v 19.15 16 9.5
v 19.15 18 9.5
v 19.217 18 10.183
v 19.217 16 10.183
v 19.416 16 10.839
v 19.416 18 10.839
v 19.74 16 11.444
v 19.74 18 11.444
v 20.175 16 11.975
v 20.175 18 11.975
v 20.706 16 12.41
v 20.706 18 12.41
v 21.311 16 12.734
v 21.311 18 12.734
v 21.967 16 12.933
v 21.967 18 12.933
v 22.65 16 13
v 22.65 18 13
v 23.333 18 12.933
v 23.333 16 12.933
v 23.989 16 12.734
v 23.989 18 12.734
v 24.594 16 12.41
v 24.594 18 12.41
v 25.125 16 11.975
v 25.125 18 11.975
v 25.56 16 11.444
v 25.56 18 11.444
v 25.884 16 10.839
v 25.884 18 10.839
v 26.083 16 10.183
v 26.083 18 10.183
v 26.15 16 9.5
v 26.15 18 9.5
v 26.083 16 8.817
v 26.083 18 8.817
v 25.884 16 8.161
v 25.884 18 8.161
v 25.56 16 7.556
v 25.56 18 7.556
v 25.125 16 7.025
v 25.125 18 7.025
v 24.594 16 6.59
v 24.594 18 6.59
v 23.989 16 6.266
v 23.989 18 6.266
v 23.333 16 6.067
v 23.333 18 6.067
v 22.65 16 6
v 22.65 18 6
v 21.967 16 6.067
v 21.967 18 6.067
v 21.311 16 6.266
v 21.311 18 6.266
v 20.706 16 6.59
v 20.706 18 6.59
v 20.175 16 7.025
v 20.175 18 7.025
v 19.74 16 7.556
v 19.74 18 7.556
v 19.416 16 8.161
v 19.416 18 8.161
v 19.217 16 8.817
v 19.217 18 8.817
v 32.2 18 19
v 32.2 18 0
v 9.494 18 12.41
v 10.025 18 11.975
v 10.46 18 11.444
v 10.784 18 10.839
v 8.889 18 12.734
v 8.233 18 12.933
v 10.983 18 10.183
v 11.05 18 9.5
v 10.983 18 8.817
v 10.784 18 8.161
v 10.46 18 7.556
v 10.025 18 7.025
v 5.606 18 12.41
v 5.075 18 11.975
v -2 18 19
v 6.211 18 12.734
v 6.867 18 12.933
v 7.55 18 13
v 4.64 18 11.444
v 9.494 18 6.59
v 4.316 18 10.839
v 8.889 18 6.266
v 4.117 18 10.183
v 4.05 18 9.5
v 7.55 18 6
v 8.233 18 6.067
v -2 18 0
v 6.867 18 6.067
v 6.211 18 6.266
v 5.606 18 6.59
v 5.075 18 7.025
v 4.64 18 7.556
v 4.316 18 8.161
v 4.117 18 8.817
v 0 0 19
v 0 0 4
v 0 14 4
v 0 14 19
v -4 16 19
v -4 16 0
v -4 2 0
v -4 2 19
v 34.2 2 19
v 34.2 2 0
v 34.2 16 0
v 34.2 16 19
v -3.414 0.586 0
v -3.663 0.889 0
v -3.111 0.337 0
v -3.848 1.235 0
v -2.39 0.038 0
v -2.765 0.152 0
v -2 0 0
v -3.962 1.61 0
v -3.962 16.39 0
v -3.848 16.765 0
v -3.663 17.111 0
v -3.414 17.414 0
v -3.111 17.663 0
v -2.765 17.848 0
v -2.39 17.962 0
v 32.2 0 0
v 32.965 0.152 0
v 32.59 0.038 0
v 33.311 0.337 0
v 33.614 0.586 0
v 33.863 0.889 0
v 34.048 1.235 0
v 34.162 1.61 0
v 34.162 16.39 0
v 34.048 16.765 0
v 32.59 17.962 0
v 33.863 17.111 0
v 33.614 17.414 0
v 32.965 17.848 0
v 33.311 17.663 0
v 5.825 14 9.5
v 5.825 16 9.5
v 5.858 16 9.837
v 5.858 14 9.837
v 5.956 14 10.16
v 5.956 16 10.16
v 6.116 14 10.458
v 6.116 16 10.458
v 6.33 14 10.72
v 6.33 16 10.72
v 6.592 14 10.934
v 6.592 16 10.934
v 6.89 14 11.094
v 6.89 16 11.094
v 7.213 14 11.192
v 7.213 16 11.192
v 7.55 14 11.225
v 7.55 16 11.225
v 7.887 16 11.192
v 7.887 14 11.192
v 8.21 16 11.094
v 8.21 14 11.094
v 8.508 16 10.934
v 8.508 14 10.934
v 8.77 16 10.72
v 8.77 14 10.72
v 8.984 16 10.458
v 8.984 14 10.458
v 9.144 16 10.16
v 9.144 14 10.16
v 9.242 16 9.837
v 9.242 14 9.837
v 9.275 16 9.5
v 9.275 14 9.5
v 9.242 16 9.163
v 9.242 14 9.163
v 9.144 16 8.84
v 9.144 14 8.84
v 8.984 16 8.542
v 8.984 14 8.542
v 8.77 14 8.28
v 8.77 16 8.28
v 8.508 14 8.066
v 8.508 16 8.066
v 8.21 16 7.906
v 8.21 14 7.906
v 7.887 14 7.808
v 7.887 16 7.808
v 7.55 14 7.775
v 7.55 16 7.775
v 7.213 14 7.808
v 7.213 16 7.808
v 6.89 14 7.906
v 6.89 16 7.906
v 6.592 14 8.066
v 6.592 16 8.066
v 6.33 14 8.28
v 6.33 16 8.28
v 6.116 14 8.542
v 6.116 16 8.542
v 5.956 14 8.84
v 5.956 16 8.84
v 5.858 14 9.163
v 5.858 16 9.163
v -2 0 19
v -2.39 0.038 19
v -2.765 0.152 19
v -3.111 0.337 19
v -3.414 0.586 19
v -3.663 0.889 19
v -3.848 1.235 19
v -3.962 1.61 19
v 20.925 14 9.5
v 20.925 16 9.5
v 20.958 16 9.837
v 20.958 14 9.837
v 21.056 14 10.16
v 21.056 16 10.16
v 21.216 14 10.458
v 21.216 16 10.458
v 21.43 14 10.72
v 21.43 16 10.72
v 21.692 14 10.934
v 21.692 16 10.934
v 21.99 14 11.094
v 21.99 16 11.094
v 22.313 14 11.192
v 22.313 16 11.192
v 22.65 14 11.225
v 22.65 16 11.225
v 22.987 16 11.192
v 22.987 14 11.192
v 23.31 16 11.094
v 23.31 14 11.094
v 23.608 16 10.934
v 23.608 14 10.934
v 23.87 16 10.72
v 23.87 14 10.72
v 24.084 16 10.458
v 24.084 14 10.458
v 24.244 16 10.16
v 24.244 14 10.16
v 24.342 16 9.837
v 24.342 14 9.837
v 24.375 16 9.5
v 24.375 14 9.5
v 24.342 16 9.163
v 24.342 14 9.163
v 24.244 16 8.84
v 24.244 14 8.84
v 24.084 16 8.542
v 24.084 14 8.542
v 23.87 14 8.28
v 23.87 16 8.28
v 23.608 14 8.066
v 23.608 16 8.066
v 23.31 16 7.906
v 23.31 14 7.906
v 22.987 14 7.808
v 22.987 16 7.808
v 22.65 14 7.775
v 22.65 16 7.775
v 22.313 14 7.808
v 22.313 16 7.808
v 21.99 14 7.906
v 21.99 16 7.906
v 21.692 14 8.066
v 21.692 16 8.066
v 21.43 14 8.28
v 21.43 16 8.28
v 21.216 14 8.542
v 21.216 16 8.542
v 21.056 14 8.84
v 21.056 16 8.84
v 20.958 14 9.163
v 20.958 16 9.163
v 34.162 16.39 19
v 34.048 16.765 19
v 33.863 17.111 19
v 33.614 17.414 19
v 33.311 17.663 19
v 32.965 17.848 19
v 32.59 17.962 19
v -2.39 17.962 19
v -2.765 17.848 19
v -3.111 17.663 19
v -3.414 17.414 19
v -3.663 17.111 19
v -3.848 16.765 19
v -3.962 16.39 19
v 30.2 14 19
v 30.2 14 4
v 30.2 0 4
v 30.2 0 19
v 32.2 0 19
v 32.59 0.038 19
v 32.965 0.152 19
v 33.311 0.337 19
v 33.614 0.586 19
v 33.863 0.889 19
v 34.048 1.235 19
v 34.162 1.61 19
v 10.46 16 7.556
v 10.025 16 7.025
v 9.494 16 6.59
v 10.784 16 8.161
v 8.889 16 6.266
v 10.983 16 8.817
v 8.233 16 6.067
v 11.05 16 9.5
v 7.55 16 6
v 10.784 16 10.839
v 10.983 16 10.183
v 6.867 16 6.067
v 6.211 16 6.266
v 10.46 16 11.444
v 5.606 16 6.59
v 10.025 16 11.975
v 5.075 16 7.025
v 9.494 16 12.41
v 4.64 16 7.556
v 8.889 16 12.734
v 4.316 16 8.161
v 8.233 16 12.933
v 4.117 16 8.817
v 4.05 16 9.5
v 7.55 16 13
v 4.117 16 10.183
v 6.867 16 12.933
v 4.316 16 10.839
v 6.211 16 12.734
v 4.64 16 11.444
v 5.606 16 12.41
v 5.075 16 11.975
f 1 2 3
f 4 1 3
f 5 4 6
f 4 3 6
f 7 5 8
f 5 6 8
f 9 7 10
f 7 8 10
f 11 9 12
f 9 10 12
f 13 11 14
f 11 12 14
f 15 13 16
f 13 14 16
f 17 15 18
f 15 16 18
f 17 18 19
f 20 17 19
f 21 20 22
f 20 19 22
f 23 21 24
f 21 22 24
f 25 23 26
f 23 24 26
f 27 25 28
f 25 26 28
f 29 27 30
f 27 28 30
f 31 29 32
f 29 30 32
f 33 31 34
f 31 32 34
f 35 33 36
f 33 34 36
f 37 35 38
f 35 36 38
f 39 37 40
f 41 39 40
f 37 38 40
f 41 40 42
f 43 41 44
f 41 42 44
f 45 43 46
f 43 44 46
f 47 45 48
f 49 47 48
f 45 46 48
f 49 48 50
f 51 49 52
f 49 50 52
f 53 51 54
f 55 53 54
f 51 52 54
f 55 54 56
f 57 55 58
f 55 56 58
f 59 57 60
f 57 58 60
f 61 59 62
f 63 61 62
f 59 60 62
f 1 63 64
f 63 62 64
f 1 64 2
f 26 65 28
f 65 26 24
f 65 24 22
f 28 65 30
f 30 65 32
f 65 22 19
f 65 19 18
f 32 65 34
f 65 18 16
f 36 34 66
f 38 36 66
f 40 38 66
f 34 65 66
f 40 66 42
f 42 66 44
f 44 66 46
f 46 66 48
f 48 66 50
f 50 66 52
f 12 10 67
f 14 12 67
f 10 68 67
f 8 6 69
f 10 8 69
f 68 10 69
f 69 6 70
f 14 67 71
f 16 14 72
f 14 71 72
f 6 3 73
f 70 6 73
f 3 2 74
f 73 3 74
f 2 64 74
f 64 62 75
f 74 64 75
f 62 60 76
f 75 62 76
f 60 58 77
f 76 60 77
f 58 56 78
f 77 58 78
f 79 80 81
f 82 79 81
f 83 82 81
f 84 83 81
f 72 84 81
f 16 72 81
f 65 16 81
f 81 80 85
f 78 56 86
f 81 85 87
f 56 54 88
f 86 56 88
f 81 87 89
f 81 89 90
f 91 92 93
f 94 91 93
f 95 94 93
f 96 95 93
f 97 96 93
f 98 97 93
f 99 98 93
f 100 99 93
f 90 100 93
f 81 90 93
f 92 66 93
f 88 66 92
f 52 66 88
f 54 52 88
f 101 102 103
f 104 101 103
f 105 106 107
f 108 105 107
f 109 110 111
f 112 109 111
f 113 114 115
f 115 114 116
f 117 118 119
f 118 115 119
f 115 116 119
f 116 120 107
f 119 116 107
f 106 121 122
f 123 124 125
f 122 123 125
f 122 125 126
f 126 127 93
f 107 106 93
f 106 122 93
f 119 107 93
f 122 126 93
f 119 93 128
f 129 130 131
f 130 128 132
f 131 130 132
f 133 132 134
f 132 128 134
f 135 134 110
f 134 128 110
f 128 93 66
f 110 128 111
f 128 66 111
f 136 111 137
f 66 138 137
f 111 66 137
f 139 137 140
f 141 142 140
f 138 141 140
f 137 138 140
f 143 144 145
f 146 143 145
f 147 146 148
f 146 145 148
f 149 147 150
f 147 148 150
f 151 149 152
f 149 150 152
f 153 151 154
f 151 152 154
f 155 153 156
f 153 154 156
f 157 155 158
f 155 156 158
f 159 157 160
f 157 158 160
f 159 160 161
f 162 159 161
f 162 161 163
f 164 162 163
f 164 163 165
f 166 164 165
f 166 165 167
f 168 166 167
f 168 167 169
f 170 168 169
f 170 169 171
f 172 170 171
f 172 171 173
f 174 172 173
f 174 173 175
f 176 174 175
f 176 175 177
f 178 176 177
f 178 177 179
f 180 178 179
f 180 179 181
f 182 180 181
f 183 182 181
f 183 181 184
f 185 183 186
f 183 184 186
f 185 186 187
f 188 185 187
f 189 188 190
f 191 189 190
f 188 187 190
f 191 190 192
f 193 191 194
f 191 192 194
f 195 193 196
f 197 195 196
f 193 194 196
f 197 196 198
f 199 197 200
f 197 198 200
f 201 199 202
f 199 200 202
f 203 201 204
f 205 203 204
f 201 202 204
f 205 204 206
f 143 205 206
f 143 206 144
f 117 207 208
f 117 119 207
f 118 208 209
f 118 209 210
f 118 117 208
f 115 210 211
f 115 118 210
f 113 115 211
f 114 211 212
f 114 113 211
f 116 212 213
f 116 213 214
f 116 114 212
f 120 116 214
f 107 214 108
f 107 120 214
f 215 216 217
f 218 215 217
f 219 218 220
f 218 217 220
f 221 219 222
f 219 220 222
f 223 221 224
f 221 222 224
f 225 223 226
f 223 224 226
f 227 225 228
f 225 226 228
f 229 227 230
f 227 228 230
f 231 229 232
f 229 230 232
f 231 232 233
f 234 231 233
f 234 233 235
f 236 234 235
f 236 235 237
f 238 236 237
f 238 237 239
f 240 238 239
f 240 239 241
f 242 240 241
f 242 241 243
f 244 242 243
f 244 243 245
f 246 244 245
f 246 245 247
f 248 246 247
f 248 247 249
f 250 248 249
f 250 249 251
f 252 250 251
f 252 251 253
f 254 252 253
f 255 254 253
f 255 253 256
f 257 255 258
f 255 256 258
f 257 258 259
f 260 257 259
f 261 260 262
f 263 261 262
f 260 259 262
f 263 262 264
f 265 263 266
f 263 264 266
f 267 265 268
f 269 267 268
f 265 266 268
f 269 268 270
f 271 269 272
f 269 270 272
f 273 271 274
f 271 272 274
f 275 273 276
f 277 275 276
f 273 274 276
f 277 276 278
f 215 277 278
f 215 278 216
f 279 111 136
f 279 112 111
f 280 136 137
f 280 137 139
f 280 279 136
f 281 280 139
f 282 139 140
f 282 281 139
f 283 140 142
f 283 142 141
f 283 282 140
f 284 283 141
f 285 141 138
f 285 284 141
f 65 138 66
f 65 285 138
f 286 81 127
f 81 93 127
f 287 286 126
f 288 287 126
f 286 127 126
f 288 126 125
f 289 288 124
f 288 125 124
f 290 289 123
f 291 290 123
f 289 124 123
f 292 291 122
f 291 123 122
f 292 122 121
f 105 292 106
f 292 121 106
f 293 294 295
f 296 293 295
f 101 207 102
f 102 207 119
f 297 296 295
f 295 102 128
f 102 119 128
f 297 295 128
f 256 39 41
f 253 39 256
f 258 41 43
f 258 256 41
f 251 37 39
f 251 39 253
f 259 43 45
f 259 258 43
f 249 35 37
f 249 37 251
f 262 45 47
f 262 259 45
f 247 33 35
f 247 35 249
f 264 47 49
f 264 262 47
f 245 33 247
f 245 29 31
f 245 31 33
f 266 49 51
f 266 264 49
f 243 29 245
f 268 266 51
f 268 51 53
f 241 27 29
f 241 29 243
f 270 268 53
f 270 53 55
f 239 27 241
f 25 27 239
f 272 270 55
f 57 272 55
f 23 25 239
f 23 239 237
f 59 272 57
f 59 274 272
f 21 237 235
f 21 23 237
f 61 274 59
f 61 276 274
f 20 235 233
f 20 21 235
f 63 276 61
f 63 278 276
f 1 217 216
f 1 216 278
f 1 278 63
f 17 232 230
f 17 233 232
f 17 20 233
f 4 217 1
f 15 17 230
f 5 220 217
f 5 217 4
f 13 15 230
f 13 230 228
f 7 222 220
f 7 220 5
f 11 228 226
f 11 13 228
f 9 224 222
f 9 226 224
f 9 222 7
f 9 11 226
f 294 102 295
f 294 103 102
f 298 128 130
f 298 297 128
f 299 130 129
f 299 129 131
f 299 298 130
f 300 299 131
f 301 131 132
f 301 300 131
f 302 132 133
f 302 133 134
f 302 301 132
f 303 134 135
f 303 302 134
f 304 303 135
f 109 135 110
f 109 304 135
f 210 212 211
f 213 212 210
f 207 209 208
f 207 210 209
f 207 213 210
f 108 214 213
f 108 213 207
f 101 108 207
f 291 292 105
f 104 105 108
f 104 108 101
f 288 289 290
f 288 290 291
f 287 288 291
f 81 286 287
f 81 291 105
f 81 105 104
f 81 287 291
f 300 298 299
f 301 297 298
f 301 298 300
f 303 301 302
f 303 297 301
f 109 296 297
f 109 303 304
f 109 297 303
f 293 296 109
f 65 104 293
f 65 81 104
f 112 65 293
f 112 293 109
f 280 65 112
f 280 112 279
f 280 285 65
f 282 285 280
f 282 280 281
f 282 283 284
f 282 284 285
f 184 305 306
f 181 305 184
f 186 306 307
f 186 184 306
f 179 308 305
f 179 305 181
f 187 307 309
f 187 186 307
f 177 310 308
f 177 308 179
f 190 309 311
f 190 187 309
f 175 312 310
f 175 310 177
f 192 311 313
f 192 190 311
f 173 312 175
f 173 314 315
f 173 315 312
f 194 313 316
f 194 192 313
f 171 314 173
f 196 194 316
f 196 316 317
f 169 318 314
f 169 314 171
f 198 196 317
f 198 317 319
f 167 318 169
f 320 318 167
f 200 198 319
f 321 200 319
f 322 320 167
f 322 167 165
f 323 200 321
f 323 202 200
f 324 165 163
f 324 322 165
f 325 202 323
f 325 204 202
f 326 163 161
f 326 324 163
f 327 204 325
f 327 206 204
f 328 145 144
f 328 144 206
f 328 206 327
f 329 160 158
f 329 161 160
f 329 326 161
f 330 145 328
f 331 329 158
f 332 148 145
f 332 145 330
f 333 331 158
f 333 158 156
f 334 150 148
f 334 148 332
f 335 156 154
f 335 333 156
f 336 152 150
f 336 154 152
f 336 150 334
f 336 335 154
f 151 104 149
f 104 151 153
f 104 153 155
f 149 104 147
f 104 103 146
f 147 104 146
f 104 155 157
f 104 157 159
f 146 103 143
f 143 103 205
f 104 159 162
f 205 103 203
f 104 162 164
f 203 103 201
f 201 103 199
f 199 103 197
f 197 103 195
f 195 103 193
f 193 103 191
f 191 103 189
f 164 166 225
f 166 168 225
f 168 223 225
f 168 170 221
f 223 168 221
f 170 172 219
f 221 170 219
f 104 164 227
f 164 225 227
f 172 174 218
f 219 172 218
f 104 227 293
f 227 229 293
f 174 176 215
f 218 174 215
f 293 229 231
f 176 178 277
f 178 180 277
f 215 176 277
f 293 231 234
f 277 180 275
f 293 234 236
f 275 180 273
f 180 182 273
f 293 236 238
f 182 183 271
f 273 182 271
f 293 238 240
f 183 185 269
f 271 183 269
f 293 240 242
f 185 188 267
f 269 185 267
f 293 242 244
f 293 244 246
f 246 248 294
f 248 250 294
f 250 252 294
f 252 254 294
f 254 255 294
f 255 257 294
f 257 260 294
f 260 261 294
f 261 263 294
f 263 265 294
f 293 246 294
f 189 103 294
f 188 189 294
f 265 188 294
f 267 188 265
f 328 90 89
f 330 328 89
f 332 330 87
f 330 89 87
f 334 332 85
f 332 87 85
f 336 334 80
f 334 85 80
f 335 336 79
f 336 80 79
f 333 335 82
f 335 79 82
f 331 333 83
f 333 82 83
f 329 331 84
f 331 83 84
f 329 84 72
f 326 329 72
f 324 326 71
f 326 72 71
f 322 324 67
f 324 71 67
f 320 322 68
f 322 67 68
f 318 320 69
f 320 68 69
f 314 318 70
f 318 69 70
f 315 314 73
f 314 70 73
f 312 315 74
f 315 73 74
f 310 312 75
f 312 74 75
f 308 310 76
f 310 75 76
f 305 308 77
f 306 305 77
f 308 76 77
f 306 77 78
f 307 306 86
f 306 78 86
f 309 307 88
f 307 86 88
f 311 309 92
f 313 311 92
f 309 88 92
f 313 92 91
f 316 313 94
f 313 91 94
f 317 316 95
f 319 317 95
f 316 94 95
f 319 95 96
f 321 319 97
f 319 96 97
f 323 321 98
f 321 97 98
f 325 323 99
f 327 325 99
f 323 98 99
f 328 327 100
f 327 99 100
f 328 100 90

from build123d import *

# Parameters (mm, degrees)
F1_DEPTH = 19
F0_W     = 30.2
F0_H     = 14
F2_DEPTH = 4
F3_R     = 2
F4_R     = 3.5
F4_R_2   = 1.725
F5_DEPTH = 2
F6_DEPTH = 4


with BuildPart() as f1:
    # F0 (on Top) → F1 (new body)
    with BuildSketch(Plane.XY):
        Polygon((-4, 0), (0, 0), (0, 14), (30.2, 14), (30.2, 0), (34.2, 0), (34.2, 18), (-4, 18), align=None)
    extrude(amount=F1_DEPTH)

    # F0 (on Top) → F2 (join)
    with BuildSketch(Plane.XY):
        with Locations((15.1, 7)):
            Rectangle(F0_W, F0_H)
        Polygon((-4, 0), (0, 0), (0, 14), (30.2, 14), (30.2, 0), (34.2, 0), (34.2, 18), (-4, 18), align=None)
    extrude(amount=F2_DEPTH)

    # F3
    f3_edges = [f1.edges().sort_by_distance(p)[0] for p in [
        (-4, 18, 9.5),
        (34.2, 18, 9.5),
        (34.2, 0, 9.5),
        (-4, 0, 9.5),
    ]]
    fillet(f3_edges, radius=F3_R)

    # F4 (on face) → F5 (cut)
    with BuildSketch(Plane(origin=(0, 18, 0), x_dir=(-1, 0, 0), z_dir=(0, 1, 0))):
        with Locations((-7.55, 9.5)):
            Circle(F4_R)
        with Locations((-7.55, 9.5)):
            Circle(F4_R_2, mode=Mode.SUBTRACT)
        with Locations((-22.65, 9.5)):
            Circle(F4_R)
        with Locations((-22.65, 9.5)):
            Circle(F4_R_2, mode=Mode.SUBTRACT)
    extrude(amount=-F5_DEPTH, mode=Mode.SUBTRACT)

    # F4 (on face) → F6 (cut, through all)
    with BuildSketch(Plane(origin=(0, 18, 0), x_dir=(-1, 0, 0), z_dir=(0, 1, 0))):
        with Locations((-22.65, 9.5)):
            Circle(F4_R_2)
        with Locations((-7.55, 9.5)):
            Circle(F4_R_2)
    extrude(amount=-F6_DEPTH, mode=Mode.SUBTRACT)


solid = f1.part
